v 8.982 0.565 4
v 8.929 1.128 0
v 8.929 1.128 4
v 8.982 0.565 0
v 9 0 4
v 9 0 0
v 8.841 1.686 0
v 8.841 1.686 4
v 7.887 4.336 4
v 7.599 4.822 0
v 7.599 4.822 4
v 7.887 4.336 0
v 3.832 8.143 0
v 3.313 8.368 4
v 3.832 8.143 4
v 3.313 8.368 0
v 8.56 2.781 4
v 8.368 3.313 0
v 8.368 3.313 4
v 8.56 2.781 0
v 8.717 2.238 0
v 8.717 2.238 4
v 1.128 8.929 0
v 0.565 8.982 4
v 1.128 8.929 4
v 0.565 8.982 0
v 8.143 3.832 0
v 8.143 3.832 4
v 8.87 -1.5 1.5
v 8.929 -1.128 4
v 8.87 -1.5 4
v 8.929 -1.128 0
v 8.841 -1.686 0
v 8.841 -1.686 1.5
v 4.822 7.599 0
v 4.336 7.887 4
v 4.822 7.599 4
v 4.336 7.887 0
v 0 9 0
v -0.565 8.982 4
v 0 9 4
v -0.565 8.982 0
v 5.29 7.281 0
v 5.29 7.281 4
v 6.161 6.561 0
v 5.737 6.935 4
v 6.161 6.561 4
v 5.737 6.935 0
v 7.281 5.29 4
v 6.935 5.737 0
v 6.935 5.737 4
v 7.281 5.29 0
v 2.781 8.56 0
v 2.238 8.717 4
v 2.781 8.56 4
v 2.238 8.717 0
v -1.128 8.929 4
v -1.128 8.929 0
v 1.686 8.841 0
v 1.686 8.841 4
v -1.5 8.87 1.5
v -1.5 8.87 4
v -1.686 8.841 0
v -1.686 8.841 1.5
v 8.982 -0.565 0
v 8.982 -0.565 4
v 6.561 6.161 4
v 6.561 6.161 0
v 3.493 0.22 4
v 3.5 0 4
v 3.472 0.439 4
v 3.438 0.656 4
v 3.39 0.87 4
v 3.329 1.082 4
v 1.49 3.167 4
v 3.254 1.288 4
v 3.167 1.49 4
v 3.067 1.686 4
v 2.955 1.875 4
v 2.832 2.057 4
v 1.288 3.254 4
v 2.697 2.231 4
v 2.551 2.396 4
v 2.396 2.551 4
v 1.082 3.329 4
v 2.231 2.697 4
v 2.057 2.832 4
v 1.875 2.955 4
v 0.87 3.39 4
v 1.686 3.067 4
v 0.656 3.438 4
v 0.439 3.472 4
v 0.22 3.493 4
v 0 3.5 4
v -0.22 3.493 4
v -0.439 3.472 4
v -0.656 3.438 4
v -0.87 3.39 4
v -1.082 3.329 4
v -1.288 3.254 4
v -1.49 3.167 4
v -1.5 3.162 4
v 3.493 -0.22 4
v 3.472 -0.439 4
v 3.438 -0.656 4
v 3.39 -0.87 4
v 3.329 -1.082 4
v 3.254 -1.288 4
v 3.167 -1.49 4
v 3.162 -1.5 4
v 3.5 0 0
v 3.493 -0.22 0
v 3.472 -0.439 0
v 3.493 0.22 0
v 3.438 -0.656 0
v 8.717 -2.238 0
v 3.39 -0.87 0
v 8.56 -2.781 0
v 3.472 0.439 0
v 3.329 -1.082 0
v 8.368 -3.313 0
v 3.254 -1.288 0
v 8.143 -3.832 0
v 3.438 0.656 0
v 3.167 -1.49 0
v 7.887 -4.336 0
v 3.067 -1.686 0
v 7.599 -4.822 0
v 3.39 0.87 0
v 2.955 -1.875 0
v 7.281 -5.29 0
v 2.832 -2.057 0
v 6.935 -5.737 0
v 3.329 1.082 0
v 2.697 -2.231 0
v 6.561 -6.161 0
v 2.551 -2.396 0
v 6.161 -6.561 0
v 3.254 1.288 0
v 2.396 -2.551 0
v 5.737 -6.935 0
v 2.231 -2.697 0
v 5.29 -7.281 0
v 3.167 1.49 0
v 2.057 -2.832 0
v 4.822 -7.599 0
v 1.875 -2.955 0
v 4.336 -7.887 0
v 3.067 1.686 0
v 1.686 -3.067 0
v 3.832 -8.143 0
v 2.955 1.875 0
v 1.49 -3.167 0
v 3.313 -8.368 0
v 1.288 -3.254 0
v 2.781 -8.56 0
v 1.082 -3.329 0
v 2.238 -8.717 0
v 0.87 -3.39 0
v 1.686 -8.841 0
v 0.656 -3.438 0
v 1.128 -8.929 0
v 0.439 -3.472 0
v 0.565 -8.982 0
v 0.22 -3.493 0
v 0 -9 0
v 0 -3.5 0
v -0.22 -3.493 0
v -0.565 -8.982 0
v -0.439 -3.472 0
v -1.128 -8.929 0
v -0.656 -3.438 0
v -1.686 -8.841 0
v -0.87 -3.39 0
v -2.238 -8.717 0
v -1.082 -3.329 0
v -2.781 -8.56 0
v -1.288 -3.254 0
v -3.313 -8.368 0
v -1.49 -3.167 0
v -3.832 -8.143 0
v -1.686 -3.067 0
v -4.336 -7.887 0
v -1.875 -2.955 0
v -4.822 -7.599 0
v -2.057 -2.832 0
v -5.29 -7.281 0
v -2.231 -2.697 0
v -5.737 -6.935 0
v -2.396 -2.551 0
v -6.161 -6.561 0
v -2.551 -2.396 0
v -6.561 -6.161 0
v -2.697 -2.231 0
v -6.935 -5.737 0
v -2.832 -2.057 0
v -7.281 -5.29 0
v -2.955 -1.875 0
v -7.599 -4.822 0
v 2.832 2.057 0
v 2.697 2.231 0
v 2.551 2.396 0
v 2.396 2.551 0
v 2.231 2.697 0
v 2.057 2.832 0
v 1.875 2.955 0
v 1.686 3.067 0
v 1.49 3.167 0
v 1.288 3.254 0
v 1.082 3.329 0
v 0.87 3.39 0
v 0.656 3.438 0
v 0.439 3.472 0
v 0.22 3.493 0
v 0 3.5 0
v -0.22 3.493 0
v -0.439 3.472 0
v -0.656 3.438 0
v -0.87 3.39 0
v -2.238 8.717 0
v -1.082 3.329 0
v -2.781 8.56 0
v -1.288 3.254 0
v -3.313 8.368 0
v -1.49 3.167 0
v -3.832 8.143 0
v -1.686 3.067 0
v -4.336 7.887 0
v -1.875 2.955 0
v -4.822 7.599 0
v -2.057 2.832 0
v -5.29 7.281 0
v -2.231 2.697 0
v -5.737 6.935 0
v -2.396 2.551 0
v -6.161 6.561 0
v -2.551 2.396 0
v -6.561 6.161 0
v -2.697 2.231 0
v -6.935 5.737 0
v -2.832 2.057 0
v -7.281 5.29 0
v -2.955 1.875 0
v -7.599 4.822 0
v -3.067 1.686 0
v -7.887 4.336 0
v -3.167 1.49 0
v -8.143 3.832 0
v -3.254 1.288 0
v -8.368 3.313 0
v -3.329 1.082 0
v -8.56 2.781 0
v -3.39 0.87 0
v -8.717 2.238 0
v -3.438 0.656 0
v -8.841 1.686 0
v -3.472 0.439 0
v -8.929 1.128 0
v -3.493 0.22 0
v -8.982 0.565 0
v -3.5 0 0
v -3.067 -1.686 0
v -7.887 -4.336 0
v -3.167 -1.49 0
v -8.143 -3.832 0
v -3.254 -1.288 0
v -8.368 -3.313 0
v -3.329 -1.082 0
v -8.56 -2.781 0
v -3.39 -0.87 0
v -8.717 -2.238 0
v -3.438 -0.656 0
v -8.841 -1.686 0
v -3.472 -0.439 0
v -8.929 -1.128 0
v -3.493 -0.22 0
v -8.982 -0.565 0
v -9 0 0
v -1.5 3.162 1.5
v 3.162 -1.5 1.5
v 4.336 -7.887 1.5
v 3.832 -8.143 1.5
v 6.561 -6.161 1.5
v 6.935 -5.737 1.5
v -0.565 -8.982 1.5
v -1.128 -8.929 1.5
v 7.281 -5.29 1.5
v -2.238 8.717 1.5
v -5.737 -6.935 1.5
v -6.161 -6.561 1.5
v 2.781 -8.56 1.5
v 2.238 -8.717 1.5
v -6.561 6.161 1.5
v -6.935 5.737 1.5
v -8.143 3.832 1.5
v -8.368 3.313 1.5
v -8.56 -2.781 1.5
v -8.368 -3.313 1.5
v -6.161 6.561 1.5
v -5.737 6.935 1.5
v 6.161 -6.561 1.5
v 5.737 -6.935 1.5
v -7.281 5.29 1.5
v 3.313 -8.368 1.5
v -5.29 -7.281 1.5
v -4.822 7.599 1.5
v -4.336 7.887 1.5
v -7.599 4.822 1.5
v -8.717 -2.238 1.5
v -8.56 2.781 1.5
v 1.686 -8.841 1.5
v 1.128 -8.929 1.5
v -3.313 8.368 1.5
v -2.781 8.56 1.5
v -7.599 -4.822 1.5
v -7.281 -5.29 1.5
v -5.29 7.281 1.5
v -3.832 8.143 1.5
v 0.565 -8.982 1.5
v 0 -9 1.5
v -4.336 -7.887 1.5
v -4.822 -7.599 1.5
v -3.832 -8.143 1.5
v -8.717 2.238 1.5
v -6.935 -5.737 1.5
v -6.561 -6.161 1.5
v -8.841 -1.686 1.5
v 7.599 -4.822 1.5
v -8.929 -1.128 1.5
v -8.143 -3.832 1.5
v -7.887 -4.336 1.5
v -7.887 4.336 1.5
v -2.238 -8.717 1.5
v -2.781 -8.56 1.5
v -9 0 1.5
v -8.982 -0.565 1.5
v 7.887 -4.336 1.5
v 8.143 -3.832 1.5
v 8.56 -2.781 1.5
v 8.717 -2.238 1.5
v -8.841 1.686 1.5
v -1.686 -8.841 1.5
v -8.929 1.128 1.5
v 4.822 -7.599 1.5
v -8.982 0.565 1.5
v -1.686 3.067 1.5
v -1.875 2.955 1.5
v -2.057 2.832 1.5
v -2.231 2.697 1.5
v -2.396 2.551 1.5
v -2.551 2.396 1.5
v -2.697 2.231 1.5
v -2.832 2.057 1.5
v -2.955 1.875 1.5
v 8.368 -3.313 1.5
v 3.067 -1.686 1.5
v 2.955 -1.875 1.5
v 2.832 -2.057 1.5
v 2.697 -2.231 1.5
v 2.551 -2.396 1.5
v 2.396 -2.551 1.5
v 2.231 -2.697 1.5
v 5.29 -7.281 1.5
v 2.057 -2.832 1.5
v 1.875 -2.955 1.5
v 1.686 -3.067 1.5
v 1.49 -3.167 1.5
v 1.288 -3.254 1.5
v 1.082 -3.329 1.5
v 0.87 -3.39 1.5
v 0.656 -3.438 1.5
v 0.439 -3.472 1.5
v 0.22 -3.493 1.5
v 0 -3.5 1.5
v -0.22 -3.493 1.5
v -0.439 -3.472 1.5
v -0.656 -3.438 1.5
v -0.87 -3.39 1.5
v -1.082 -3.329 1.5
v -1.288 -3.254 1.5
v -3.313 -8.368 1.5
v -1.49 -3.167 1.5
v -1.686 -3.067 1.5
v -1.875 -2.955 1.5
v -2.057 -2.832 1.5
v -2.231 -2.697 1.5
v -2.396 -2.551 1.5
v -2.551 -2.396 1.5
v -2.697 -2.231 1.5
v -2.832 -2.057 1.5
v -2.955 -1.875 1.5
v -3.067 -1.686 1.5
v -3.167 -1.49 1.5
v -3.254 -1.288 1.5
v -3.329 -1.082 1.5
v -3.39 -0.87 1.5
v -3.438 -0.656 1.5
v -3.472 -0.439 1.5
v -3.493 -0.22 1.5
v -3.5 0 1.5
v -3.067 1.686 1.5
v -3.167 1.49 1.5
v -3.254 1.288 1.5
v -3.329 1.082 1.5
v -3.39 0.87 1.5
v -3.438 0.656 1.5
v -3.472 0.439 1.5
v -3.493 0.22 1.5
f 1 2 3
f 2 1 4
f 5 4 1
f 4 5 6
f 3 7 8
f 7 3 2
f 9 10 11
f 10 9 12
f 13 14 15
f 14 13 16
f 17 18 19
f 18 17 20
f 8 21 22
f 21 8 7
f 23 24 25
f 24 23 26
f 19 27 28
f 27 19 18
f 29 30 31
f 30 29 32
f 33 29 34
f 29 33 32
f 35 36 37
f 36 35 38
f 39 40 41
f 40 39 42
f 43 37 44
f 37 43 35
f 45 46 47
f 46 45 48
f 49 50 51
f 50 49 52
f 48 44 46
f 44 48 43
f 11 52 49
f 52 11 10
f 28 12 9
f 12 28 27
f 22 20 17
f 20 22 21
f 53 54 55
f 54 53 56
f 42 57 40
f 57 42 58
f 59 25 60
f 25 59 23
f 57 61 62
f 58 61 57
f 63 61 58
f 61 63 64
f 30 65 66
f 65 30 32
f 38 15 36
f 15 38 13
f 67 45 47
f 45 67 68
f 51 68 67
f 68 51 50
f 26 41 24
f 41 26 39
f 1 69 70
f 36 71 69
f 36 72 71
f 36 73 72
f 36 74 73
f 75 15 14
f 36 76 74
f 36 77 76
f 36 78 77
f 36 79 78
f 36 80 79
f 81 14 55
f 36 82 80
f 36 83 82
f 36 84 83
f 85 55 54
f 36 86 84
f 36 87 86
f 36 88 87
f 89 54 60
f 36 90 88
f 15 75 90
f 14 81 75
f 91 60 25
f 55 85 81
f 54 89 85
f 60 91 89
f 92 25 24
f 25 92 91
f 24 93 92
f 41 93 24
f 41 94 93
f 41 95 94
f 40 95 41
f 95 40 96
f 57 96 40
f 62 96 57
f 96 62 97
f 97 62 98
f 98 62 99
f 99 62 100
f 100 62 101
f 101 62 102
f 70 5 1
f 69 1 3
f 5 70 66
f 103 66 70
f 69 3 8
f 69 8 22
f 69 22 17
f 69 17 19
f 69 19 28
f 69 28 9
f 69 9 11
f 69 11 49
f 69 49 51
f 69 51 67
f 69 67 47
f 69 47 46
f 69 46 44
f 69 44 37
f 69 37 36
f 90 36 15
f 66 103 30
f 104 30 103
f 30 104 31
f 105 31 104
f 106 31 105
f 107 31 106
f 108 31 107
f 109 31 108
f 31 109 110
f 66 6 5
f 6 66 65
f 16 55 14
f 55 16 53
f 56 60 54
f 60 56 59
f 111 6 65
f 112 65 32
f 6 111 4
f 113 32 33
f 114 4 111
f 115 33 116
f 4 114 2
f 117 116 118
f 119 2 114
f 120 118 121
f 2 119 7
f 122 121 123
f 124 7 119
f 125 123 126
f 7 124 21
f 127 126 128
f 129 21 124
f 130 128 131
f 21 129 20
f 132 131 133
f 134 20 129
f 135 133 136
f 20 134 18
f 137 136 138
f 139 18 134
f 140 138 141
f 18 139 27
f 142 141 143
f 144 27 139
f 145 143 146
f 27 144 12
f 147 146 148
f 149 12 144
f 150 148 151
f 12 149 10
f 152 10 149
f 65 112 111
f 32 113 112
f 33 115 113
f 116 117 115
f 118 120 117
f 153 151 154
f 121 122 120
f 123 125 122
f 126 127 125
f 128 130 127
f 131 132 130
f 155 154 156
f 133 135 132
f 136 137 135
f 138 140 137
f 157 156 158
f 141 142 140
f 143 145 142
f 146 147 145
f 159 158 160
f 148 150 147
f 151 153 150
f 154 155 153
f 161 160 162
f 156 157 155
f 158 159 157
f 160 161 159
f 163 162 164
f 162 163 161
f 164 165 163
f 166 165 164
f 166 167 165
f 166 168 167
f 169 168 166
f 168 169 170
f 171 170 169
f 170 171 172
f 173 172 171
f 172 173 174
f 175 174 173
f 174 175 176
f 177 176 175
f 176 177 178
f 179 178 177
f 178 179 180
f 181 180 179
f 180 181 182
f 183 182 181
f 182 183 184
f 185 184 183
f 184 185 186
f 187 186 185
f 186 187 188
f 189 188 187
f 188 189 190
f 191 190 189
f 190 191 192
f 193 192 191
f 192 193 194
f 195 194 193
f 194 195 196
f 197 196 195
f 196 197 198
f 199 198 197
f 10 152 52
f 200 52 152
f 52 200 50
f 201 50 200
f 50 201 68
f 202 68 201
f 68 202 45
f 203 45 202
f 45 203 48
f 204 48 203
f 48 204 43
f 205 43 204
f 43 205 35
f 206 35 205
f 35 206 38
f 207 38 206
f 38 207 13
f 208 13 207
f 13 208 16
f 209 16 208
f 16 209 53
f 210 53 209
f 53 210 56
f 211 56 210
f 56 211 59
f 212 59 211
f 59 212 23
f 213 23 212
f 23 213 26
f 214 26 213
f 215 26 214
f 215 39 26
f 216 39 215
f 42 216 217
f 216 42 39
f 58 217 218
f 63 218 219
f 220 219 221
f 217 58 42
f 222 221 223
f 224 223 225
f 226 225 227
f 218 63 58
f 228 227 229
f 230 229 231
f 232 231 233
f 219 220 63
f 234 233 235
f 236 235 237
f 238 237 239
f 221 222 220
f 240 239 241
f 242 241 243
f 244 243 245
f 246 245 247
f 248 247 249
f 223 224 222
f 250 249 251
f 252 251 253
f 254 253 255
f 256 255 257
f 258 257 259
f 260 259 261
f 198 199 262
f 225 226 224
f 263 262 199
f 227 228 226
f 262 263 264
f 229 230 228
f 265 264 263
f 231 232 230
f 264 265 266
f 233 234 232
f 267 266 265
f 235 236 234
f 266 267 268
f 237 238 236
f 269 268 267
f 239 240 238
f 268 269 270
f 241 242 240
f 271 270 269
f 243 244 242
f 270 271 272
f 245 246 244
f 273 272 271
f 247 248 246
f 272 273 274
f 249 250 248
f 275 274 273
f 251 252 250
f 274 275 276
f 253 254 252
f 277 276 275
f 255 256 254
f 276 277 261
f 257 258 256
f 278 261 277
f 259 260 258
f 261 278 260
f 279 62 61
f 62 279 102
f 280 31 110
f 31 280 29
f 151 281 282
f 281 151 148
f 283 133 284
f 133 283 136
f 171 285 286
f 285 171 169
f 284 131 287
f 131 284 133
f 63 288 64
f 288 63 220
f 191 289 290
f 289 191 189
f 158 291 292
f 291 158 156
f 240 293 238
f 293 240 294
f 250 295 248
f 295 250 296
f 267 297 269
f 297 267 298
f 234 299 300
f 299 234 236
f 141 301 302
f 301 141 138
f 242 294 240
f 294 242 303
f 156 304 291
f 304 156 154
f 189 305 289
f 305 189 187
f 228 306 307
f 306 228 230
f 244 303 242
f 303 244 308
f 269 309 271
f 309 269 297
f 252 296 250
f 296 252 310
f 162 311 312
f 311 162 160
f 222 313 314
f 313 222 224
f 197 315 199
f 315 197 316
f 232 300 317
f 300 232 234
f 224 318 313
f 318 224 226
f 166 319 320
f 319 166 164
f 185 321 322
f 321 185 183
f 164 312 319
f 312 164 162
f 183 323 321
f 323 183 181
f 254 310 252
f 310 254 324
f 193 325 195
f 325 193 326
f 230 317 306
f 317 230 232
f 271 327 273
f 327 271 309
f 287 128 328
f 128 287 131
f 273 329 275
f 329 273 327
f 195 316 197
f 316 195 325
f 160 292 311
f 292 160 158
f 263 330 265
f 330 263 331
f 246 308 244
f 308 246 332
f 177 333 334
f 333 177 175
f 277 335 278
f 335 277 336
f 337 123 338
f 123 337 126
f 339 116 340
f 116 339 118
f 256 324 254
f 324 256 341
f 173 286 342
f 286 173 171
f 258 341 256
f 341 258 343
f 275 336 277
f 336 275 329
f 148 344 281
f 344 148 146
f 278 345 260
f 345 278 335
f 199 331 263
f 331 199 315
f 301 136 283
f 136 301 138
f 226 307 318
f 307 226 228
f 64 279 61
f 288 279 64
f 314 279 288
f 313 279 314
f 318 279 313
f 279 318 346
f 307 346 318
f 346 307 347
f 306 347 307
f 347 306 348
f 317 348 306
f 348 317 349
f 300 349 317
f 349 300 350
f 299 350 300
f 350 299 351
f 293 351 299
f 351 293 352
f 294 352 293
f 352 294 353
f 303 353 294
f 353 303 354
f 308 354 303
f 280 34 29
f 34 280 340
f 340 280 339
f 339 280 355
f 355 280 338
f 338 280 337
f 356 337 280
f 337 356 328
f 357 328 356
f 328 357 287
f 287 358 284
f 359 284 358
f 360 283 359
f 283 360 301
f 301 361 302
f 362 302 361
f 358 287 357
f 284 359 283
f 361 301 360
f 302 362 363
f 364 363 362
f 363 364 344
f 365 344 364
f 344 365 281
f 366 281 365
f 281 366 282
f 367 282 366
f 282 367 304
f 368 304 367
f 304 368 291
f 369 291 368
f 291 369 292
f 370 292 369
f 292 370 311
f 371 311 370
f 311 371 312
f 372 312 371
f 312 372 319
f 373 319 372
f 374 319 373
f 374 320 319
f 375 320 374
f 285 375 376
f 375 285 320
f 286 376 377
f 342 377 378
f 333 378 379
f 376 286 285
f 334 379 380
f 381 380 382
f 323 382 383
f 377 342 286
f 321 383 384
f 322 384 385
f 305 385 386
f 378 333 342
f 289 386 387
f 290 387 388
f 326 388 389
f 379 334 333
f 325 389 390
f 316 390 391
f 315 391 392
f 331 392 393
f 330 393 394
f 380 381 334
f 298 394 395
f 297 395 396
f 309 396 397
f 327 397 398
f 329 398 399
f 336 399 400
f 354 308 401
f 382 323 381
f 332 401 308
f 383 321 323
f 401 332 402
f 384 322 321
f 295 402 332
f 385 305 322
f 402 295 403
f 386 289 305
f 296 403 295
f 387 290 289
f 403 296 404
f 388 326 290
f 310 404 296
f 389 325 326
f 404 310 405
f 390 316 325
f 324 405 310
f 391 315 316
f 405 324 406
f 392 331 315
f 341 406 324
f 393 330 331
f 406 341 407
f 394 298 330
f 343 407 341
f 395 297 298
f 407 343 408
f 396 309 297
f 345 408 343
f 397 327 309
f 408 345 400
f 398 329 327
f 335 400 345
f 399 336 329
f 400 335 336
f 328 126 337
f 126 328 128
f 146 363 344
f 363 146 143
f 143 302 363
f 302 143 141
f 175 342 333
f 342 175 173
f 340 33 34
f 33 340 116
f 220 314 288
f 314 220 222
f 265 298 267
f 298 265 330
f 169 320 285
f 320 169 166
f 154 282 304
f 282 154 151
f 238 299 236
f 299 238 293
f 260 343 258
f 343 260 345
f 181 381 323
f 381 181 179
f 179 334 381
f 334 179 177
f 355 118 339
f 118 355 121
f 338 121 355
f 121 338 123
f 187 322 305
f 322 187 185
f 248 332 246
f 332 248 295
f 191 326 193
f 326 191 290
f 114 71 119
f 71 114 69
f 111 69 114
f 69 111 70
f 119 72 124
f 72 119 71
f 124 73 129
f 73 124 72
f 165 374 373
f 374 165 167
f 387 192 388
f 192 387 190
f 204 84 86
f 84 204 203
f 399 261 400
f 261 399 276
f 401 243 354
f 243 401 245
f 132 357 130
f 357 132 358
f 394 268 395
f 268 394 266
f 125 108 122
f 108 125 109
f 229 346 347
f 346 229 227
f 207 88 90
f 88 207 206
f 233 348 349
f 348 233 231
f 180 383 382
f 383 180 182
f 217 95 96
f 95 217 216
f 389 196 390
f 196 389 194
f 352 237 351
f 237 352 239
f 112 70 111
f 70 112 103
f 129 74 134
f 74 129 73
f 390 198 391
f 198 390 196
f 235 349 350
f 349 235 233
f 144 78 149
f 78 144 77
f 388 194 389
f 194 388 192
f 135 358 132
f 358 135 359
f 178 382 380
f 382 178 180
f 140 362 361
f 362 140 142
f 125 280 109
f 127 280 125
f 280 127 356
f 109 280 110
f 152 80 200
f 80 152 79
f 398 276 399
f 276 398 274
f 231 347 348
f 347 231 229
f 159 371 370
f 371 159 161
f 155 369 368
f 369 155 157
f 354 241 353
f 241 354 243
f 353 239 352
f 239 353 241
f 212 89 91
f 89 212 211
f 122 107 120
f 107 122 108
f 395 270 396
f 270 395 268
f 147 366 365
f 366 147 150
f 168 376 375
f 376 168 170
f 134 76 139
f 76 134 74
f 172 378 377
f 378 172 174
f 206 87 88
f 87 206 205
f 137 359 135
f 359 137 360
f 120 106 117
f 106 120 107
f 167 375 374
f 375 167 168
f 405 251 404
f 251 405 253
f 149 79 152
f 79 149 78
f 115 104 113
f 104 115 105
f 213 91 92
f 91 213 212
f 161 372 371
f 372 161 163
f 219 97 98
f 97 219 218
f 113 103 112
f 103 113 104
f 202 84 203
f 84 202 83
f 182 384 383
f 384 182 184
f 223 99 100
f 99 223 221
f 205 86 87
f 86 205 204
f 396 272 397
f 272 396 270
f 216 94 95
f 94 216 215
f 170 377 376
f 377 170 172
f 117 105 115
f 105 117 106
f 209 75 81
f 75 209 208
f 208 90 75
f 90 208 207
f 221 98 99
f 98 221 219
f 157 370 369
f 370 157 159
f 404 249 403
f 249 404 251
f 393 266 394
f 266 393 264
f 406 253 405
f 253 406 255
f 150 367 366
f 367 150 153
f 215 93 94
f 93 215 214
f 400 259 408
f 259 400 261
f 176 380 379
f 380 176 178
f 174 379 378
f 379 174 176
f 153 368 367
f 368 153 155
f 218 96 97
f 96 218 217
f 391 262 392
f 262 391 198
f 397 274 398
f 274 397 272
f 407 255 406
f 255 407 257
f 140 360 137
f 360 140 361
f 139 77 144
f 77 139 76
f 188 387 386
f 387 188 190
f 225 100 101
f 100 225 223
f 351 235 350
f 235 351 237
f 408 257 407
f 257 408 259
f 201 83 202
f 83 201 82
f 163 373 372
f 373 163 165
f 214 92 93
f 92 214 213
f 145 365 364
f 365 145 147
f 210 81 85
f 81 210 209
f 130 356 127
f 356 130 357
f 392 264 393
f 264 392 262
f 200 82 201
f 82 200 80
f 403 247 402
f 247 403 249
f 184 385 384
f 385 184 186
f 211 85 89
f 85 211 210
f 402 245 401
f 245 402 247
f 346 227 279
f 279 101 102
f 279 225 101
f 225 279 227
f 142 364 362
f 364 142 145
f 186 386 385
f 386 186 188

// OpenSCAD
Z1= 2.5;
Z2 = 1.5;

D1 = 18;
D2 = 7;
$fn=100;


difference(){
    
    
    
    union(){

        intersection(){
            cylinder(d=D1, h=Z1+Z2);
            translate([-1.5,-1.5,0])
            cube([D1,D1, Z1+Z2]);
        }
        cylinder(d=D1, h=Z2);
    }
    cylinder(d=D2, h=Z1+Z2);
}
